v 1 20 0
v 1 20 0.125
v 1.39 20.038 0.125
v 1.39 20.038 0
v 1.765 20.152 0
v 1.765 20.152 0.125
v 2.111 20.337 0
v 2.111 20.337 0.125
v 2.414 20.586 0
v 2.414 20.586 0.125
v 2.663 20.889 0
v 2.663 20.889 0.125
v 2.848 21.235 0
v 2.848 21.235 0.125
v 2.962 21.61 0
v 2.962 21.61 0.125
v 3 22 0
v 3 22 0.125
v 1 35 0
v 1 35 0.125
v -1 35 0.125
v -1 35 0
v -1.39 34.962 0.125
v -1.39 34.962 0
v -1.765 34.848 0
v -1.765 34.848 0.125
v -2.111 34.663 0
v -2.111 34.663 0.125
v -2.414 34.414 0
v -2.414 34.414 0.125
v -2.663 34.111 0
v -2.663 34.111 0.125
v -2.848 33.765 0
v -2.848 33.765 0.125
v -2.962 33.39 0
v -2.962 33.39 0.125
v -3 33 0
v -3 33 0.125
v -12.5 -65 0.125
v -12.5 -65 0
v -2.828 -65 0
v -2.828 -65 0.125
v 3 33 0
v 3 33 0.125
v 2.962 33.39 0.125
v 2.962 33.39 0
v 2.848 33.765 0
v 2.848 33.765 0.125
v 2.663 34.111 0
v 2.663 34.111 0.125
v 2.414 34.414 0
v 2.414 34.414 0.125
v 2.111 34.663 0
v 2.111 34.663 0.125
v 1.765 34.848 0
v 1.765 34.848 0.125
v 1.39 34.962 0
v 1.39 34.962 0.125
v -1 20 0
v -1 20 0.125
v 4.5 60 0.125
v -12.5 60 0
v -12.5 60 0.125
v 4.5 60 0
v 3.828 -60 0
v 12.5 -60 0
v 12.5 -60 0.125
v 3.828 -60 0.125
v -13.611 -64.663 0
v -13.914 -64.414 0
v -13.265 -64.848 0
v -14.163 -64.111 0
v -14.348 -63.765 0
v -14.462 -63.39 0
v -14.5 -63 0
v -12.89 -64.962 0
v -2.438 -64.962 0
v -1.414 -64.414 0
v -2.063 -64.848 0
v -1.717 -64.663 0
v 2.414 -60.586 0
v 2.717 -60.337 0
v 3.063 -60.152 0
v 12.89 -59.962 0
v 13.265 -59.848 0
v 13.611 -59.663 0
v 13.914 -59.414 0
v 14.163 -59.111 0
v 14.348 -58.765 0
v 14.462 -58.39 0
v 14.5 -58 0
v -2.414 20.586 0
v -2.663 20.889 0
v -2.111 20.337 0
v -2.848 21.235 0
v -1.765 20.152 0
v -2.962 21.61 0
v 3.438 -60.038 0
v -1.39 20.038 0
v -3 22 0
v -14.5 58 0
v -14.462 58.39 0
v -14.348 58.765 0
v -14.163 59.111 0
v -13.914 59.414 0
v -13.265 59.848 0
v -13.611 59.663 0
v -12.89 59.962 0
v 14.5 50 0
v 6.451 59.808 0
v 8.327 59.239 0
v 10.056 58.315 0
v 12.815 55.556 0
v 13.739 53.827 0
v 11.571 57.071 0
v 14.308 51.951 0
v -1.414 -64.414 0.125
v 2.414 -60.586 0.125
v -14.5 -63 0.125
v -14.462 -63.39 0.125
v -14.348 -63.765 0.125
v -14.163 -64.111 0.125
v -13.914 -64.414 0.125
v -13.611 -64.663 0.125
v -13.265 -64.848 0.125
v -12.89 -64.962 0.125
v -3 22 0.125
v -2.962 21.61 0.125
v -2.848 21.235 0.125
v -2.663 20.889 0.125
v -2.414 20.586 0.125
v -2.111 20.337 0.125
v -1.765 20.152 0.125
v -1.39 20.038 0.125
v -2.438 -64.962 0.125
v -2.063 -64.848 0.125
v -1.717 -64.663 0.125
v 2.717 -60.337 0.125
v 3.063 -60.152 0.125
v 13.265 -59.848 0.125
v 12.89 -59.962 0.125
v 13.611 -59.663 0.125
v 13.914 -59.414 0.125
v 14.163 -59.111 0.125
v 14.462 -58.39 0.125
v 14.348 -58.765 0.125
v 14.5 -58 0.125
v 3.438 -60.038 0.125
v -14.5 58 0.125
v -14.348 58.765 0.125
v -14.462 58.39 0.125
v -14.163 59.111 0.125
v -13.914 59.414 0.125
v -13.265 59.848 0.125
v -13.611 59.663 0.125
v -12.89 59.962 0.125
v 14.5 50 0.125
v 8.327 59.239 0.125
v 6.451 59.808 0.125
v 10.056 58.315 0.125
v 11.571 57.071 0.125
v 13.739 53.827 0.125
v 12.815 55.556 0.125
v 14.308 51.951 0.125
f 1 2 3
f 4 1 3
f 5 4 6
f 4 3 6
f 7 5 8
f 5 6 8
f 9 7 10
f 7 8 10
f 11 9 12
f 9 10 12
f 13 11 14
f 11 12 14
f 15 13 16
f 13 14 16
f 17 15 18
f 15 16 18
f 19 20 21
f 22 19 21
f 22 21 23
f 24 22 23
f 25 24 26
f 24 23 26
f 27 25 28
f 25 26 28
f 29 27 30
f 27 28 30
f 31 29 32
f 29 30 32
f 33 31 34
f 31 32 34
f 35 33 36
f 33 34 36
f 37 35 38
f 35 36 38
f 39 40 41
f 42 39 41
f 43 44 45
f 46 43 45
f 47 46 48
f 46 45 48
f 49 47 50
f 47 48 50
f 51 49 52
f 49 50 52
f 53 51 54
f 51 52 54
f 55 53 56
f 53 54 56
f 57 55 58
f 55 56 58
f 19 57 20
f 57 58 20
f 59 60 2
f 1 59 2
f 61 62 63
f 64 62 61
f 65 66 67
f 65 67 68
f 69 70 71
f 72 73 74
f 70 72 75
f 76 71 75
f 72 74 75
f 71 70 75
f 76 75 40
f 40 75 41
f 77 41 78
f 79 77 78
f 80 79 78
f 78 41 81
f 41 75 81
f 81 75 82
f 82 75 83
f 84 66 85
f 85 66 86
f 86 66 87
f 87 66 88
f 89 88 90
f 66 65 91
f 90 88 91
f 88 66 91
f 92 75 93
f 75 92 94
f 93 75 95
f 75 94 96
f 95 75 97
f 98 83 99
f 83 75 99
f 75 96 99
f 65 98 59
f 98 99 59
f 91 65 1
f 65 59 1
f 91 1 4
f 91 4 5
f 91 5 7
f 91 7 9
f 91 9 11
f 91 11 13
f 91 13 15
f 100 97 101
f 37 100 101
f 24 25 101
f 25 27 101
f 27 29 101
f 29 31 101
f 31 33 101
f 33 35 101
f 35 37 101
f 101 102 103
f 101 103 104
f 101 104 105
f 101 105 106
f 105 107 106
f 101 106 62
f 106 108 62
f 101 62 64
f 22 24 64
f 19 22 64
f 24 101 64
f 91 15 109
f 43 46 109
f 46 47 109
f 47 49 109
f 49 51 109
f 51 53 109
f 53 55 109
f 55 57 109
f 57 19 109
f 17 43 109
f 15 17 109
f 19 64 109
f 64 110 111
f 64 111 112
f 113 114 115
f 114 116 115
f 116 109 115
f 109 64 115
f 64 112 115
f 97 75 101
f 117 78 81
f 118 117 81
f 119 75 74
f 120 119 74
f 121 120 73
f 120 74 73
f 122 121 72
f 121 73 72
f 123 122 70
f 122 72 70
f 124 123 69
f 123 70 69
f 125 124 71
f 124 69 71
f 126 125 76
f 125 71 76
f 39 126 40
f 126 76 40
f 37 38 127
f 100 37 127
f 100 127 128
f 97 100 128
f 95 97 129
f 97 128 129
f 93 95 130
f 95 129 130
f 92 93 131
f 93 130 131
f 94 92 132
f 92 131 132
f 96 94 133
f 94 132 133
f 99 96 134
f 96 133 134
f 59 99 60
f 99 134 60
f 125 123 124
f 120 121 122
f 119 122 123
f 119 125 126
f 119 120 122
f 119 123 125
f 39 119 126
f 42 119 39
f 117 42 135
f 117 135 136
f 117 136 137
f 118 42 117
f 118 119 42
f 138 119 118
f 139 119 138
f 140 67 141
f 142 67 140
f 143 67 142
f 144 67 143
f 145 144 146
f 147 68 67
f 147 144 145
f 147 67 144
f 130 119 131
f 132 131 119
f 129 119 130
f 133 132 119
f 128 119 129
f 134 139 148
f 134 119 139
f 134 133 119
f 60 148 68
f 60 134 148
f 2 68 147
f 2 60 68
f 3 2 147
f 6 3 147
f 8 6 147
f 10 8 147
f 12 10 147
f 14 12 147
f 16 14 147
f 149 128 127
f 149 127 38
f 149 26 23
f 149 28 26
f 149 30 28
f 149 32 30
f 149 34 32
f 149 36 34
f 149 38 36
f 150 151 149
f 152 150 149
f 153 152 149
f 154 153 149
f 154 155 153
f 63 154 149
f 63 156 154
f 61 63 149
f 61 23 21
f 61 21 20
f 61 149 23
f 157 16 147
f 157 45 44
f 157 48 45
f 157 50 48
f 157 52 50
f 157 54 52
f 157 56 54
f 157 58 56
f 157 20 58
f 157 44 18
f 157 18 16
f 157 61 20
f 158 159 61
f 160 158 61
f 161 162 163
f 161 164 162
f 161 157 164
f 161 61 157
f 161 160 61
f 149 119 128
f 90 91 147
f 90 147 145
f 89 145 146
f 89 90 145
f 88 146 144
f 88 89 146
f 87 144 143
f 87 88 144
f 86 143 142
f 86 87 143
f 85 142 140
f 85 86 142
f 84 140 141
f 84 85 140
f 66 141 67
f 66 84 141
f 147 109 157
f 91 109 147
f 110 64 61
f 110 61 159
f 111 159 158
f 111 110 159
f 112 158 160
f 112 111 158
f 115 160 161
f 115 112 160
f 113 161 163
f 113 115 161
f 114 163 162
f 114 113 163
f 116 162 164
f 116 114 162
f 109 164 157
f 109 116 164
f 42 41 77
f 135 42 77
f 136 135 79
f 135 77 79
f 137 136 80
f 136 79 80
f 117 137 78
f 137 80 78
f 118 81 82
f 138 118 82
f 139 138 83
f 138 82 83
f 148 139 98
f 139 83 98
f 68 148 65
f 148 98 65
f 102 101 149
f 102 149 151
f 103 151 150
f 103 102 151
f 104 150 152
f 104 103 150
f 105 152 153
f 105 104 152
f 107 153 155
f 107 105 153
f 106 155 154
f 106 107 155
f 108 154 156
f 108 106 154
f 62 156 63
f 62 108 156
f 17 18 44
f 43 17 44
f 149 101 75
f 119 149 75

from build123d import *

# Parameters (mm, degrees)
BOSS_EXTRUDE6_DEPTH = 0.125
BOSS_EXTRUDE7_DEPTH = 0.125
CUT_EXTRUDE2_DEPTH  = 67.597789941


with BuildPart() as part:
    # Sketch9 → Boss-Extrude6 (new body)
    with BuildSketch(Plane.XY):
        with BuildLine():
            Line((-12.5, 60), (4.5, 60))
            ThreePointArc((4.5, 60), (11.571067812, 57.071067812), (14.5, 50))
            Line((14.5, 50), (14.5, -58))
            ThreePointArc((14.5, -58), (13.914213562, -59.414213562), (12.5, -60))
            Line((12.5, -60), (-12.5, -60))
            ThreePointArc((-12.5, -60), (-13.914213562, -59.414213562), (-14.5, -58))
            Line((-14.5, -58), (-14.5, 58))
            ThreePointArc((-14.5, 58), (-13.914213562, 59.414213562), (-12.5, 60))
        make_face()
    extrude(amount=BOSS_EXTRUDE6_DEPTH)

    # Sketch10 → Boss-Extrude7 (add)
    with BuildSketch(Plane(origin=(0, 0, 0), x_dir=(-1, 0, 0), z_dir=(0, 0, -1))):
        with BuildLine():
            Line((14.5, -58), (14.5, -63))
            ThreePointArc((14.5, -63), (13.914213562, -64.414213562), (12.5, -65))
            Line((12.5, -65), (2.828427125, -65))
            ThreePointArc((2.828427125, -65), (2.06306026, -64.847759065), (1.414213562, -64.414213562))
            Line((1.414213562, -64.414213562), (-2.414213562, -60.585786438))
            ThreePointArc((-2.414213562, -60.585786438), (-3.06306026, -60.152240935), (-3.828427125, -60))
            Line((-3.828427125, -60), (-12.5, -60))
            Line((-12.5, -60), (-12.5, -58))
            Line((-12.5, -58), (14.5, -58))
        make_face()
    extrude(amount=-BOSS_EXTRUDE7_DEPTH)

    # Sketch11 → Cut-Extrude2 (cut, through all)
    with BuildSketch(Plane.XY.offset(0.125)):
        with BuildLine():
            Line((-1, 20), (1, 20))
            ThreePointArc((1, 20), (2.414213562, 20.585786438), (3, 22))
            Line((3, 22), (3, 33))
            ThreePointArc((3, 33), (2.414213562, 34.414213562), (1, 35))
            Line((1, 35), (-1, 35))
            ThreePointArc((-1, 35), (-2.414213562, 34.414213562), (-3, 33))
            Line((-3, 33), (-3, 22))
            ThreePointArc((-3, 22), (-2.414213562, 20.585786438), (-1, 20))
        make_face()
    extrude(amount=-CUT_EXTRUDE2_DEPTH, mode=Mode.SUBTRACT)


solid = part.part
